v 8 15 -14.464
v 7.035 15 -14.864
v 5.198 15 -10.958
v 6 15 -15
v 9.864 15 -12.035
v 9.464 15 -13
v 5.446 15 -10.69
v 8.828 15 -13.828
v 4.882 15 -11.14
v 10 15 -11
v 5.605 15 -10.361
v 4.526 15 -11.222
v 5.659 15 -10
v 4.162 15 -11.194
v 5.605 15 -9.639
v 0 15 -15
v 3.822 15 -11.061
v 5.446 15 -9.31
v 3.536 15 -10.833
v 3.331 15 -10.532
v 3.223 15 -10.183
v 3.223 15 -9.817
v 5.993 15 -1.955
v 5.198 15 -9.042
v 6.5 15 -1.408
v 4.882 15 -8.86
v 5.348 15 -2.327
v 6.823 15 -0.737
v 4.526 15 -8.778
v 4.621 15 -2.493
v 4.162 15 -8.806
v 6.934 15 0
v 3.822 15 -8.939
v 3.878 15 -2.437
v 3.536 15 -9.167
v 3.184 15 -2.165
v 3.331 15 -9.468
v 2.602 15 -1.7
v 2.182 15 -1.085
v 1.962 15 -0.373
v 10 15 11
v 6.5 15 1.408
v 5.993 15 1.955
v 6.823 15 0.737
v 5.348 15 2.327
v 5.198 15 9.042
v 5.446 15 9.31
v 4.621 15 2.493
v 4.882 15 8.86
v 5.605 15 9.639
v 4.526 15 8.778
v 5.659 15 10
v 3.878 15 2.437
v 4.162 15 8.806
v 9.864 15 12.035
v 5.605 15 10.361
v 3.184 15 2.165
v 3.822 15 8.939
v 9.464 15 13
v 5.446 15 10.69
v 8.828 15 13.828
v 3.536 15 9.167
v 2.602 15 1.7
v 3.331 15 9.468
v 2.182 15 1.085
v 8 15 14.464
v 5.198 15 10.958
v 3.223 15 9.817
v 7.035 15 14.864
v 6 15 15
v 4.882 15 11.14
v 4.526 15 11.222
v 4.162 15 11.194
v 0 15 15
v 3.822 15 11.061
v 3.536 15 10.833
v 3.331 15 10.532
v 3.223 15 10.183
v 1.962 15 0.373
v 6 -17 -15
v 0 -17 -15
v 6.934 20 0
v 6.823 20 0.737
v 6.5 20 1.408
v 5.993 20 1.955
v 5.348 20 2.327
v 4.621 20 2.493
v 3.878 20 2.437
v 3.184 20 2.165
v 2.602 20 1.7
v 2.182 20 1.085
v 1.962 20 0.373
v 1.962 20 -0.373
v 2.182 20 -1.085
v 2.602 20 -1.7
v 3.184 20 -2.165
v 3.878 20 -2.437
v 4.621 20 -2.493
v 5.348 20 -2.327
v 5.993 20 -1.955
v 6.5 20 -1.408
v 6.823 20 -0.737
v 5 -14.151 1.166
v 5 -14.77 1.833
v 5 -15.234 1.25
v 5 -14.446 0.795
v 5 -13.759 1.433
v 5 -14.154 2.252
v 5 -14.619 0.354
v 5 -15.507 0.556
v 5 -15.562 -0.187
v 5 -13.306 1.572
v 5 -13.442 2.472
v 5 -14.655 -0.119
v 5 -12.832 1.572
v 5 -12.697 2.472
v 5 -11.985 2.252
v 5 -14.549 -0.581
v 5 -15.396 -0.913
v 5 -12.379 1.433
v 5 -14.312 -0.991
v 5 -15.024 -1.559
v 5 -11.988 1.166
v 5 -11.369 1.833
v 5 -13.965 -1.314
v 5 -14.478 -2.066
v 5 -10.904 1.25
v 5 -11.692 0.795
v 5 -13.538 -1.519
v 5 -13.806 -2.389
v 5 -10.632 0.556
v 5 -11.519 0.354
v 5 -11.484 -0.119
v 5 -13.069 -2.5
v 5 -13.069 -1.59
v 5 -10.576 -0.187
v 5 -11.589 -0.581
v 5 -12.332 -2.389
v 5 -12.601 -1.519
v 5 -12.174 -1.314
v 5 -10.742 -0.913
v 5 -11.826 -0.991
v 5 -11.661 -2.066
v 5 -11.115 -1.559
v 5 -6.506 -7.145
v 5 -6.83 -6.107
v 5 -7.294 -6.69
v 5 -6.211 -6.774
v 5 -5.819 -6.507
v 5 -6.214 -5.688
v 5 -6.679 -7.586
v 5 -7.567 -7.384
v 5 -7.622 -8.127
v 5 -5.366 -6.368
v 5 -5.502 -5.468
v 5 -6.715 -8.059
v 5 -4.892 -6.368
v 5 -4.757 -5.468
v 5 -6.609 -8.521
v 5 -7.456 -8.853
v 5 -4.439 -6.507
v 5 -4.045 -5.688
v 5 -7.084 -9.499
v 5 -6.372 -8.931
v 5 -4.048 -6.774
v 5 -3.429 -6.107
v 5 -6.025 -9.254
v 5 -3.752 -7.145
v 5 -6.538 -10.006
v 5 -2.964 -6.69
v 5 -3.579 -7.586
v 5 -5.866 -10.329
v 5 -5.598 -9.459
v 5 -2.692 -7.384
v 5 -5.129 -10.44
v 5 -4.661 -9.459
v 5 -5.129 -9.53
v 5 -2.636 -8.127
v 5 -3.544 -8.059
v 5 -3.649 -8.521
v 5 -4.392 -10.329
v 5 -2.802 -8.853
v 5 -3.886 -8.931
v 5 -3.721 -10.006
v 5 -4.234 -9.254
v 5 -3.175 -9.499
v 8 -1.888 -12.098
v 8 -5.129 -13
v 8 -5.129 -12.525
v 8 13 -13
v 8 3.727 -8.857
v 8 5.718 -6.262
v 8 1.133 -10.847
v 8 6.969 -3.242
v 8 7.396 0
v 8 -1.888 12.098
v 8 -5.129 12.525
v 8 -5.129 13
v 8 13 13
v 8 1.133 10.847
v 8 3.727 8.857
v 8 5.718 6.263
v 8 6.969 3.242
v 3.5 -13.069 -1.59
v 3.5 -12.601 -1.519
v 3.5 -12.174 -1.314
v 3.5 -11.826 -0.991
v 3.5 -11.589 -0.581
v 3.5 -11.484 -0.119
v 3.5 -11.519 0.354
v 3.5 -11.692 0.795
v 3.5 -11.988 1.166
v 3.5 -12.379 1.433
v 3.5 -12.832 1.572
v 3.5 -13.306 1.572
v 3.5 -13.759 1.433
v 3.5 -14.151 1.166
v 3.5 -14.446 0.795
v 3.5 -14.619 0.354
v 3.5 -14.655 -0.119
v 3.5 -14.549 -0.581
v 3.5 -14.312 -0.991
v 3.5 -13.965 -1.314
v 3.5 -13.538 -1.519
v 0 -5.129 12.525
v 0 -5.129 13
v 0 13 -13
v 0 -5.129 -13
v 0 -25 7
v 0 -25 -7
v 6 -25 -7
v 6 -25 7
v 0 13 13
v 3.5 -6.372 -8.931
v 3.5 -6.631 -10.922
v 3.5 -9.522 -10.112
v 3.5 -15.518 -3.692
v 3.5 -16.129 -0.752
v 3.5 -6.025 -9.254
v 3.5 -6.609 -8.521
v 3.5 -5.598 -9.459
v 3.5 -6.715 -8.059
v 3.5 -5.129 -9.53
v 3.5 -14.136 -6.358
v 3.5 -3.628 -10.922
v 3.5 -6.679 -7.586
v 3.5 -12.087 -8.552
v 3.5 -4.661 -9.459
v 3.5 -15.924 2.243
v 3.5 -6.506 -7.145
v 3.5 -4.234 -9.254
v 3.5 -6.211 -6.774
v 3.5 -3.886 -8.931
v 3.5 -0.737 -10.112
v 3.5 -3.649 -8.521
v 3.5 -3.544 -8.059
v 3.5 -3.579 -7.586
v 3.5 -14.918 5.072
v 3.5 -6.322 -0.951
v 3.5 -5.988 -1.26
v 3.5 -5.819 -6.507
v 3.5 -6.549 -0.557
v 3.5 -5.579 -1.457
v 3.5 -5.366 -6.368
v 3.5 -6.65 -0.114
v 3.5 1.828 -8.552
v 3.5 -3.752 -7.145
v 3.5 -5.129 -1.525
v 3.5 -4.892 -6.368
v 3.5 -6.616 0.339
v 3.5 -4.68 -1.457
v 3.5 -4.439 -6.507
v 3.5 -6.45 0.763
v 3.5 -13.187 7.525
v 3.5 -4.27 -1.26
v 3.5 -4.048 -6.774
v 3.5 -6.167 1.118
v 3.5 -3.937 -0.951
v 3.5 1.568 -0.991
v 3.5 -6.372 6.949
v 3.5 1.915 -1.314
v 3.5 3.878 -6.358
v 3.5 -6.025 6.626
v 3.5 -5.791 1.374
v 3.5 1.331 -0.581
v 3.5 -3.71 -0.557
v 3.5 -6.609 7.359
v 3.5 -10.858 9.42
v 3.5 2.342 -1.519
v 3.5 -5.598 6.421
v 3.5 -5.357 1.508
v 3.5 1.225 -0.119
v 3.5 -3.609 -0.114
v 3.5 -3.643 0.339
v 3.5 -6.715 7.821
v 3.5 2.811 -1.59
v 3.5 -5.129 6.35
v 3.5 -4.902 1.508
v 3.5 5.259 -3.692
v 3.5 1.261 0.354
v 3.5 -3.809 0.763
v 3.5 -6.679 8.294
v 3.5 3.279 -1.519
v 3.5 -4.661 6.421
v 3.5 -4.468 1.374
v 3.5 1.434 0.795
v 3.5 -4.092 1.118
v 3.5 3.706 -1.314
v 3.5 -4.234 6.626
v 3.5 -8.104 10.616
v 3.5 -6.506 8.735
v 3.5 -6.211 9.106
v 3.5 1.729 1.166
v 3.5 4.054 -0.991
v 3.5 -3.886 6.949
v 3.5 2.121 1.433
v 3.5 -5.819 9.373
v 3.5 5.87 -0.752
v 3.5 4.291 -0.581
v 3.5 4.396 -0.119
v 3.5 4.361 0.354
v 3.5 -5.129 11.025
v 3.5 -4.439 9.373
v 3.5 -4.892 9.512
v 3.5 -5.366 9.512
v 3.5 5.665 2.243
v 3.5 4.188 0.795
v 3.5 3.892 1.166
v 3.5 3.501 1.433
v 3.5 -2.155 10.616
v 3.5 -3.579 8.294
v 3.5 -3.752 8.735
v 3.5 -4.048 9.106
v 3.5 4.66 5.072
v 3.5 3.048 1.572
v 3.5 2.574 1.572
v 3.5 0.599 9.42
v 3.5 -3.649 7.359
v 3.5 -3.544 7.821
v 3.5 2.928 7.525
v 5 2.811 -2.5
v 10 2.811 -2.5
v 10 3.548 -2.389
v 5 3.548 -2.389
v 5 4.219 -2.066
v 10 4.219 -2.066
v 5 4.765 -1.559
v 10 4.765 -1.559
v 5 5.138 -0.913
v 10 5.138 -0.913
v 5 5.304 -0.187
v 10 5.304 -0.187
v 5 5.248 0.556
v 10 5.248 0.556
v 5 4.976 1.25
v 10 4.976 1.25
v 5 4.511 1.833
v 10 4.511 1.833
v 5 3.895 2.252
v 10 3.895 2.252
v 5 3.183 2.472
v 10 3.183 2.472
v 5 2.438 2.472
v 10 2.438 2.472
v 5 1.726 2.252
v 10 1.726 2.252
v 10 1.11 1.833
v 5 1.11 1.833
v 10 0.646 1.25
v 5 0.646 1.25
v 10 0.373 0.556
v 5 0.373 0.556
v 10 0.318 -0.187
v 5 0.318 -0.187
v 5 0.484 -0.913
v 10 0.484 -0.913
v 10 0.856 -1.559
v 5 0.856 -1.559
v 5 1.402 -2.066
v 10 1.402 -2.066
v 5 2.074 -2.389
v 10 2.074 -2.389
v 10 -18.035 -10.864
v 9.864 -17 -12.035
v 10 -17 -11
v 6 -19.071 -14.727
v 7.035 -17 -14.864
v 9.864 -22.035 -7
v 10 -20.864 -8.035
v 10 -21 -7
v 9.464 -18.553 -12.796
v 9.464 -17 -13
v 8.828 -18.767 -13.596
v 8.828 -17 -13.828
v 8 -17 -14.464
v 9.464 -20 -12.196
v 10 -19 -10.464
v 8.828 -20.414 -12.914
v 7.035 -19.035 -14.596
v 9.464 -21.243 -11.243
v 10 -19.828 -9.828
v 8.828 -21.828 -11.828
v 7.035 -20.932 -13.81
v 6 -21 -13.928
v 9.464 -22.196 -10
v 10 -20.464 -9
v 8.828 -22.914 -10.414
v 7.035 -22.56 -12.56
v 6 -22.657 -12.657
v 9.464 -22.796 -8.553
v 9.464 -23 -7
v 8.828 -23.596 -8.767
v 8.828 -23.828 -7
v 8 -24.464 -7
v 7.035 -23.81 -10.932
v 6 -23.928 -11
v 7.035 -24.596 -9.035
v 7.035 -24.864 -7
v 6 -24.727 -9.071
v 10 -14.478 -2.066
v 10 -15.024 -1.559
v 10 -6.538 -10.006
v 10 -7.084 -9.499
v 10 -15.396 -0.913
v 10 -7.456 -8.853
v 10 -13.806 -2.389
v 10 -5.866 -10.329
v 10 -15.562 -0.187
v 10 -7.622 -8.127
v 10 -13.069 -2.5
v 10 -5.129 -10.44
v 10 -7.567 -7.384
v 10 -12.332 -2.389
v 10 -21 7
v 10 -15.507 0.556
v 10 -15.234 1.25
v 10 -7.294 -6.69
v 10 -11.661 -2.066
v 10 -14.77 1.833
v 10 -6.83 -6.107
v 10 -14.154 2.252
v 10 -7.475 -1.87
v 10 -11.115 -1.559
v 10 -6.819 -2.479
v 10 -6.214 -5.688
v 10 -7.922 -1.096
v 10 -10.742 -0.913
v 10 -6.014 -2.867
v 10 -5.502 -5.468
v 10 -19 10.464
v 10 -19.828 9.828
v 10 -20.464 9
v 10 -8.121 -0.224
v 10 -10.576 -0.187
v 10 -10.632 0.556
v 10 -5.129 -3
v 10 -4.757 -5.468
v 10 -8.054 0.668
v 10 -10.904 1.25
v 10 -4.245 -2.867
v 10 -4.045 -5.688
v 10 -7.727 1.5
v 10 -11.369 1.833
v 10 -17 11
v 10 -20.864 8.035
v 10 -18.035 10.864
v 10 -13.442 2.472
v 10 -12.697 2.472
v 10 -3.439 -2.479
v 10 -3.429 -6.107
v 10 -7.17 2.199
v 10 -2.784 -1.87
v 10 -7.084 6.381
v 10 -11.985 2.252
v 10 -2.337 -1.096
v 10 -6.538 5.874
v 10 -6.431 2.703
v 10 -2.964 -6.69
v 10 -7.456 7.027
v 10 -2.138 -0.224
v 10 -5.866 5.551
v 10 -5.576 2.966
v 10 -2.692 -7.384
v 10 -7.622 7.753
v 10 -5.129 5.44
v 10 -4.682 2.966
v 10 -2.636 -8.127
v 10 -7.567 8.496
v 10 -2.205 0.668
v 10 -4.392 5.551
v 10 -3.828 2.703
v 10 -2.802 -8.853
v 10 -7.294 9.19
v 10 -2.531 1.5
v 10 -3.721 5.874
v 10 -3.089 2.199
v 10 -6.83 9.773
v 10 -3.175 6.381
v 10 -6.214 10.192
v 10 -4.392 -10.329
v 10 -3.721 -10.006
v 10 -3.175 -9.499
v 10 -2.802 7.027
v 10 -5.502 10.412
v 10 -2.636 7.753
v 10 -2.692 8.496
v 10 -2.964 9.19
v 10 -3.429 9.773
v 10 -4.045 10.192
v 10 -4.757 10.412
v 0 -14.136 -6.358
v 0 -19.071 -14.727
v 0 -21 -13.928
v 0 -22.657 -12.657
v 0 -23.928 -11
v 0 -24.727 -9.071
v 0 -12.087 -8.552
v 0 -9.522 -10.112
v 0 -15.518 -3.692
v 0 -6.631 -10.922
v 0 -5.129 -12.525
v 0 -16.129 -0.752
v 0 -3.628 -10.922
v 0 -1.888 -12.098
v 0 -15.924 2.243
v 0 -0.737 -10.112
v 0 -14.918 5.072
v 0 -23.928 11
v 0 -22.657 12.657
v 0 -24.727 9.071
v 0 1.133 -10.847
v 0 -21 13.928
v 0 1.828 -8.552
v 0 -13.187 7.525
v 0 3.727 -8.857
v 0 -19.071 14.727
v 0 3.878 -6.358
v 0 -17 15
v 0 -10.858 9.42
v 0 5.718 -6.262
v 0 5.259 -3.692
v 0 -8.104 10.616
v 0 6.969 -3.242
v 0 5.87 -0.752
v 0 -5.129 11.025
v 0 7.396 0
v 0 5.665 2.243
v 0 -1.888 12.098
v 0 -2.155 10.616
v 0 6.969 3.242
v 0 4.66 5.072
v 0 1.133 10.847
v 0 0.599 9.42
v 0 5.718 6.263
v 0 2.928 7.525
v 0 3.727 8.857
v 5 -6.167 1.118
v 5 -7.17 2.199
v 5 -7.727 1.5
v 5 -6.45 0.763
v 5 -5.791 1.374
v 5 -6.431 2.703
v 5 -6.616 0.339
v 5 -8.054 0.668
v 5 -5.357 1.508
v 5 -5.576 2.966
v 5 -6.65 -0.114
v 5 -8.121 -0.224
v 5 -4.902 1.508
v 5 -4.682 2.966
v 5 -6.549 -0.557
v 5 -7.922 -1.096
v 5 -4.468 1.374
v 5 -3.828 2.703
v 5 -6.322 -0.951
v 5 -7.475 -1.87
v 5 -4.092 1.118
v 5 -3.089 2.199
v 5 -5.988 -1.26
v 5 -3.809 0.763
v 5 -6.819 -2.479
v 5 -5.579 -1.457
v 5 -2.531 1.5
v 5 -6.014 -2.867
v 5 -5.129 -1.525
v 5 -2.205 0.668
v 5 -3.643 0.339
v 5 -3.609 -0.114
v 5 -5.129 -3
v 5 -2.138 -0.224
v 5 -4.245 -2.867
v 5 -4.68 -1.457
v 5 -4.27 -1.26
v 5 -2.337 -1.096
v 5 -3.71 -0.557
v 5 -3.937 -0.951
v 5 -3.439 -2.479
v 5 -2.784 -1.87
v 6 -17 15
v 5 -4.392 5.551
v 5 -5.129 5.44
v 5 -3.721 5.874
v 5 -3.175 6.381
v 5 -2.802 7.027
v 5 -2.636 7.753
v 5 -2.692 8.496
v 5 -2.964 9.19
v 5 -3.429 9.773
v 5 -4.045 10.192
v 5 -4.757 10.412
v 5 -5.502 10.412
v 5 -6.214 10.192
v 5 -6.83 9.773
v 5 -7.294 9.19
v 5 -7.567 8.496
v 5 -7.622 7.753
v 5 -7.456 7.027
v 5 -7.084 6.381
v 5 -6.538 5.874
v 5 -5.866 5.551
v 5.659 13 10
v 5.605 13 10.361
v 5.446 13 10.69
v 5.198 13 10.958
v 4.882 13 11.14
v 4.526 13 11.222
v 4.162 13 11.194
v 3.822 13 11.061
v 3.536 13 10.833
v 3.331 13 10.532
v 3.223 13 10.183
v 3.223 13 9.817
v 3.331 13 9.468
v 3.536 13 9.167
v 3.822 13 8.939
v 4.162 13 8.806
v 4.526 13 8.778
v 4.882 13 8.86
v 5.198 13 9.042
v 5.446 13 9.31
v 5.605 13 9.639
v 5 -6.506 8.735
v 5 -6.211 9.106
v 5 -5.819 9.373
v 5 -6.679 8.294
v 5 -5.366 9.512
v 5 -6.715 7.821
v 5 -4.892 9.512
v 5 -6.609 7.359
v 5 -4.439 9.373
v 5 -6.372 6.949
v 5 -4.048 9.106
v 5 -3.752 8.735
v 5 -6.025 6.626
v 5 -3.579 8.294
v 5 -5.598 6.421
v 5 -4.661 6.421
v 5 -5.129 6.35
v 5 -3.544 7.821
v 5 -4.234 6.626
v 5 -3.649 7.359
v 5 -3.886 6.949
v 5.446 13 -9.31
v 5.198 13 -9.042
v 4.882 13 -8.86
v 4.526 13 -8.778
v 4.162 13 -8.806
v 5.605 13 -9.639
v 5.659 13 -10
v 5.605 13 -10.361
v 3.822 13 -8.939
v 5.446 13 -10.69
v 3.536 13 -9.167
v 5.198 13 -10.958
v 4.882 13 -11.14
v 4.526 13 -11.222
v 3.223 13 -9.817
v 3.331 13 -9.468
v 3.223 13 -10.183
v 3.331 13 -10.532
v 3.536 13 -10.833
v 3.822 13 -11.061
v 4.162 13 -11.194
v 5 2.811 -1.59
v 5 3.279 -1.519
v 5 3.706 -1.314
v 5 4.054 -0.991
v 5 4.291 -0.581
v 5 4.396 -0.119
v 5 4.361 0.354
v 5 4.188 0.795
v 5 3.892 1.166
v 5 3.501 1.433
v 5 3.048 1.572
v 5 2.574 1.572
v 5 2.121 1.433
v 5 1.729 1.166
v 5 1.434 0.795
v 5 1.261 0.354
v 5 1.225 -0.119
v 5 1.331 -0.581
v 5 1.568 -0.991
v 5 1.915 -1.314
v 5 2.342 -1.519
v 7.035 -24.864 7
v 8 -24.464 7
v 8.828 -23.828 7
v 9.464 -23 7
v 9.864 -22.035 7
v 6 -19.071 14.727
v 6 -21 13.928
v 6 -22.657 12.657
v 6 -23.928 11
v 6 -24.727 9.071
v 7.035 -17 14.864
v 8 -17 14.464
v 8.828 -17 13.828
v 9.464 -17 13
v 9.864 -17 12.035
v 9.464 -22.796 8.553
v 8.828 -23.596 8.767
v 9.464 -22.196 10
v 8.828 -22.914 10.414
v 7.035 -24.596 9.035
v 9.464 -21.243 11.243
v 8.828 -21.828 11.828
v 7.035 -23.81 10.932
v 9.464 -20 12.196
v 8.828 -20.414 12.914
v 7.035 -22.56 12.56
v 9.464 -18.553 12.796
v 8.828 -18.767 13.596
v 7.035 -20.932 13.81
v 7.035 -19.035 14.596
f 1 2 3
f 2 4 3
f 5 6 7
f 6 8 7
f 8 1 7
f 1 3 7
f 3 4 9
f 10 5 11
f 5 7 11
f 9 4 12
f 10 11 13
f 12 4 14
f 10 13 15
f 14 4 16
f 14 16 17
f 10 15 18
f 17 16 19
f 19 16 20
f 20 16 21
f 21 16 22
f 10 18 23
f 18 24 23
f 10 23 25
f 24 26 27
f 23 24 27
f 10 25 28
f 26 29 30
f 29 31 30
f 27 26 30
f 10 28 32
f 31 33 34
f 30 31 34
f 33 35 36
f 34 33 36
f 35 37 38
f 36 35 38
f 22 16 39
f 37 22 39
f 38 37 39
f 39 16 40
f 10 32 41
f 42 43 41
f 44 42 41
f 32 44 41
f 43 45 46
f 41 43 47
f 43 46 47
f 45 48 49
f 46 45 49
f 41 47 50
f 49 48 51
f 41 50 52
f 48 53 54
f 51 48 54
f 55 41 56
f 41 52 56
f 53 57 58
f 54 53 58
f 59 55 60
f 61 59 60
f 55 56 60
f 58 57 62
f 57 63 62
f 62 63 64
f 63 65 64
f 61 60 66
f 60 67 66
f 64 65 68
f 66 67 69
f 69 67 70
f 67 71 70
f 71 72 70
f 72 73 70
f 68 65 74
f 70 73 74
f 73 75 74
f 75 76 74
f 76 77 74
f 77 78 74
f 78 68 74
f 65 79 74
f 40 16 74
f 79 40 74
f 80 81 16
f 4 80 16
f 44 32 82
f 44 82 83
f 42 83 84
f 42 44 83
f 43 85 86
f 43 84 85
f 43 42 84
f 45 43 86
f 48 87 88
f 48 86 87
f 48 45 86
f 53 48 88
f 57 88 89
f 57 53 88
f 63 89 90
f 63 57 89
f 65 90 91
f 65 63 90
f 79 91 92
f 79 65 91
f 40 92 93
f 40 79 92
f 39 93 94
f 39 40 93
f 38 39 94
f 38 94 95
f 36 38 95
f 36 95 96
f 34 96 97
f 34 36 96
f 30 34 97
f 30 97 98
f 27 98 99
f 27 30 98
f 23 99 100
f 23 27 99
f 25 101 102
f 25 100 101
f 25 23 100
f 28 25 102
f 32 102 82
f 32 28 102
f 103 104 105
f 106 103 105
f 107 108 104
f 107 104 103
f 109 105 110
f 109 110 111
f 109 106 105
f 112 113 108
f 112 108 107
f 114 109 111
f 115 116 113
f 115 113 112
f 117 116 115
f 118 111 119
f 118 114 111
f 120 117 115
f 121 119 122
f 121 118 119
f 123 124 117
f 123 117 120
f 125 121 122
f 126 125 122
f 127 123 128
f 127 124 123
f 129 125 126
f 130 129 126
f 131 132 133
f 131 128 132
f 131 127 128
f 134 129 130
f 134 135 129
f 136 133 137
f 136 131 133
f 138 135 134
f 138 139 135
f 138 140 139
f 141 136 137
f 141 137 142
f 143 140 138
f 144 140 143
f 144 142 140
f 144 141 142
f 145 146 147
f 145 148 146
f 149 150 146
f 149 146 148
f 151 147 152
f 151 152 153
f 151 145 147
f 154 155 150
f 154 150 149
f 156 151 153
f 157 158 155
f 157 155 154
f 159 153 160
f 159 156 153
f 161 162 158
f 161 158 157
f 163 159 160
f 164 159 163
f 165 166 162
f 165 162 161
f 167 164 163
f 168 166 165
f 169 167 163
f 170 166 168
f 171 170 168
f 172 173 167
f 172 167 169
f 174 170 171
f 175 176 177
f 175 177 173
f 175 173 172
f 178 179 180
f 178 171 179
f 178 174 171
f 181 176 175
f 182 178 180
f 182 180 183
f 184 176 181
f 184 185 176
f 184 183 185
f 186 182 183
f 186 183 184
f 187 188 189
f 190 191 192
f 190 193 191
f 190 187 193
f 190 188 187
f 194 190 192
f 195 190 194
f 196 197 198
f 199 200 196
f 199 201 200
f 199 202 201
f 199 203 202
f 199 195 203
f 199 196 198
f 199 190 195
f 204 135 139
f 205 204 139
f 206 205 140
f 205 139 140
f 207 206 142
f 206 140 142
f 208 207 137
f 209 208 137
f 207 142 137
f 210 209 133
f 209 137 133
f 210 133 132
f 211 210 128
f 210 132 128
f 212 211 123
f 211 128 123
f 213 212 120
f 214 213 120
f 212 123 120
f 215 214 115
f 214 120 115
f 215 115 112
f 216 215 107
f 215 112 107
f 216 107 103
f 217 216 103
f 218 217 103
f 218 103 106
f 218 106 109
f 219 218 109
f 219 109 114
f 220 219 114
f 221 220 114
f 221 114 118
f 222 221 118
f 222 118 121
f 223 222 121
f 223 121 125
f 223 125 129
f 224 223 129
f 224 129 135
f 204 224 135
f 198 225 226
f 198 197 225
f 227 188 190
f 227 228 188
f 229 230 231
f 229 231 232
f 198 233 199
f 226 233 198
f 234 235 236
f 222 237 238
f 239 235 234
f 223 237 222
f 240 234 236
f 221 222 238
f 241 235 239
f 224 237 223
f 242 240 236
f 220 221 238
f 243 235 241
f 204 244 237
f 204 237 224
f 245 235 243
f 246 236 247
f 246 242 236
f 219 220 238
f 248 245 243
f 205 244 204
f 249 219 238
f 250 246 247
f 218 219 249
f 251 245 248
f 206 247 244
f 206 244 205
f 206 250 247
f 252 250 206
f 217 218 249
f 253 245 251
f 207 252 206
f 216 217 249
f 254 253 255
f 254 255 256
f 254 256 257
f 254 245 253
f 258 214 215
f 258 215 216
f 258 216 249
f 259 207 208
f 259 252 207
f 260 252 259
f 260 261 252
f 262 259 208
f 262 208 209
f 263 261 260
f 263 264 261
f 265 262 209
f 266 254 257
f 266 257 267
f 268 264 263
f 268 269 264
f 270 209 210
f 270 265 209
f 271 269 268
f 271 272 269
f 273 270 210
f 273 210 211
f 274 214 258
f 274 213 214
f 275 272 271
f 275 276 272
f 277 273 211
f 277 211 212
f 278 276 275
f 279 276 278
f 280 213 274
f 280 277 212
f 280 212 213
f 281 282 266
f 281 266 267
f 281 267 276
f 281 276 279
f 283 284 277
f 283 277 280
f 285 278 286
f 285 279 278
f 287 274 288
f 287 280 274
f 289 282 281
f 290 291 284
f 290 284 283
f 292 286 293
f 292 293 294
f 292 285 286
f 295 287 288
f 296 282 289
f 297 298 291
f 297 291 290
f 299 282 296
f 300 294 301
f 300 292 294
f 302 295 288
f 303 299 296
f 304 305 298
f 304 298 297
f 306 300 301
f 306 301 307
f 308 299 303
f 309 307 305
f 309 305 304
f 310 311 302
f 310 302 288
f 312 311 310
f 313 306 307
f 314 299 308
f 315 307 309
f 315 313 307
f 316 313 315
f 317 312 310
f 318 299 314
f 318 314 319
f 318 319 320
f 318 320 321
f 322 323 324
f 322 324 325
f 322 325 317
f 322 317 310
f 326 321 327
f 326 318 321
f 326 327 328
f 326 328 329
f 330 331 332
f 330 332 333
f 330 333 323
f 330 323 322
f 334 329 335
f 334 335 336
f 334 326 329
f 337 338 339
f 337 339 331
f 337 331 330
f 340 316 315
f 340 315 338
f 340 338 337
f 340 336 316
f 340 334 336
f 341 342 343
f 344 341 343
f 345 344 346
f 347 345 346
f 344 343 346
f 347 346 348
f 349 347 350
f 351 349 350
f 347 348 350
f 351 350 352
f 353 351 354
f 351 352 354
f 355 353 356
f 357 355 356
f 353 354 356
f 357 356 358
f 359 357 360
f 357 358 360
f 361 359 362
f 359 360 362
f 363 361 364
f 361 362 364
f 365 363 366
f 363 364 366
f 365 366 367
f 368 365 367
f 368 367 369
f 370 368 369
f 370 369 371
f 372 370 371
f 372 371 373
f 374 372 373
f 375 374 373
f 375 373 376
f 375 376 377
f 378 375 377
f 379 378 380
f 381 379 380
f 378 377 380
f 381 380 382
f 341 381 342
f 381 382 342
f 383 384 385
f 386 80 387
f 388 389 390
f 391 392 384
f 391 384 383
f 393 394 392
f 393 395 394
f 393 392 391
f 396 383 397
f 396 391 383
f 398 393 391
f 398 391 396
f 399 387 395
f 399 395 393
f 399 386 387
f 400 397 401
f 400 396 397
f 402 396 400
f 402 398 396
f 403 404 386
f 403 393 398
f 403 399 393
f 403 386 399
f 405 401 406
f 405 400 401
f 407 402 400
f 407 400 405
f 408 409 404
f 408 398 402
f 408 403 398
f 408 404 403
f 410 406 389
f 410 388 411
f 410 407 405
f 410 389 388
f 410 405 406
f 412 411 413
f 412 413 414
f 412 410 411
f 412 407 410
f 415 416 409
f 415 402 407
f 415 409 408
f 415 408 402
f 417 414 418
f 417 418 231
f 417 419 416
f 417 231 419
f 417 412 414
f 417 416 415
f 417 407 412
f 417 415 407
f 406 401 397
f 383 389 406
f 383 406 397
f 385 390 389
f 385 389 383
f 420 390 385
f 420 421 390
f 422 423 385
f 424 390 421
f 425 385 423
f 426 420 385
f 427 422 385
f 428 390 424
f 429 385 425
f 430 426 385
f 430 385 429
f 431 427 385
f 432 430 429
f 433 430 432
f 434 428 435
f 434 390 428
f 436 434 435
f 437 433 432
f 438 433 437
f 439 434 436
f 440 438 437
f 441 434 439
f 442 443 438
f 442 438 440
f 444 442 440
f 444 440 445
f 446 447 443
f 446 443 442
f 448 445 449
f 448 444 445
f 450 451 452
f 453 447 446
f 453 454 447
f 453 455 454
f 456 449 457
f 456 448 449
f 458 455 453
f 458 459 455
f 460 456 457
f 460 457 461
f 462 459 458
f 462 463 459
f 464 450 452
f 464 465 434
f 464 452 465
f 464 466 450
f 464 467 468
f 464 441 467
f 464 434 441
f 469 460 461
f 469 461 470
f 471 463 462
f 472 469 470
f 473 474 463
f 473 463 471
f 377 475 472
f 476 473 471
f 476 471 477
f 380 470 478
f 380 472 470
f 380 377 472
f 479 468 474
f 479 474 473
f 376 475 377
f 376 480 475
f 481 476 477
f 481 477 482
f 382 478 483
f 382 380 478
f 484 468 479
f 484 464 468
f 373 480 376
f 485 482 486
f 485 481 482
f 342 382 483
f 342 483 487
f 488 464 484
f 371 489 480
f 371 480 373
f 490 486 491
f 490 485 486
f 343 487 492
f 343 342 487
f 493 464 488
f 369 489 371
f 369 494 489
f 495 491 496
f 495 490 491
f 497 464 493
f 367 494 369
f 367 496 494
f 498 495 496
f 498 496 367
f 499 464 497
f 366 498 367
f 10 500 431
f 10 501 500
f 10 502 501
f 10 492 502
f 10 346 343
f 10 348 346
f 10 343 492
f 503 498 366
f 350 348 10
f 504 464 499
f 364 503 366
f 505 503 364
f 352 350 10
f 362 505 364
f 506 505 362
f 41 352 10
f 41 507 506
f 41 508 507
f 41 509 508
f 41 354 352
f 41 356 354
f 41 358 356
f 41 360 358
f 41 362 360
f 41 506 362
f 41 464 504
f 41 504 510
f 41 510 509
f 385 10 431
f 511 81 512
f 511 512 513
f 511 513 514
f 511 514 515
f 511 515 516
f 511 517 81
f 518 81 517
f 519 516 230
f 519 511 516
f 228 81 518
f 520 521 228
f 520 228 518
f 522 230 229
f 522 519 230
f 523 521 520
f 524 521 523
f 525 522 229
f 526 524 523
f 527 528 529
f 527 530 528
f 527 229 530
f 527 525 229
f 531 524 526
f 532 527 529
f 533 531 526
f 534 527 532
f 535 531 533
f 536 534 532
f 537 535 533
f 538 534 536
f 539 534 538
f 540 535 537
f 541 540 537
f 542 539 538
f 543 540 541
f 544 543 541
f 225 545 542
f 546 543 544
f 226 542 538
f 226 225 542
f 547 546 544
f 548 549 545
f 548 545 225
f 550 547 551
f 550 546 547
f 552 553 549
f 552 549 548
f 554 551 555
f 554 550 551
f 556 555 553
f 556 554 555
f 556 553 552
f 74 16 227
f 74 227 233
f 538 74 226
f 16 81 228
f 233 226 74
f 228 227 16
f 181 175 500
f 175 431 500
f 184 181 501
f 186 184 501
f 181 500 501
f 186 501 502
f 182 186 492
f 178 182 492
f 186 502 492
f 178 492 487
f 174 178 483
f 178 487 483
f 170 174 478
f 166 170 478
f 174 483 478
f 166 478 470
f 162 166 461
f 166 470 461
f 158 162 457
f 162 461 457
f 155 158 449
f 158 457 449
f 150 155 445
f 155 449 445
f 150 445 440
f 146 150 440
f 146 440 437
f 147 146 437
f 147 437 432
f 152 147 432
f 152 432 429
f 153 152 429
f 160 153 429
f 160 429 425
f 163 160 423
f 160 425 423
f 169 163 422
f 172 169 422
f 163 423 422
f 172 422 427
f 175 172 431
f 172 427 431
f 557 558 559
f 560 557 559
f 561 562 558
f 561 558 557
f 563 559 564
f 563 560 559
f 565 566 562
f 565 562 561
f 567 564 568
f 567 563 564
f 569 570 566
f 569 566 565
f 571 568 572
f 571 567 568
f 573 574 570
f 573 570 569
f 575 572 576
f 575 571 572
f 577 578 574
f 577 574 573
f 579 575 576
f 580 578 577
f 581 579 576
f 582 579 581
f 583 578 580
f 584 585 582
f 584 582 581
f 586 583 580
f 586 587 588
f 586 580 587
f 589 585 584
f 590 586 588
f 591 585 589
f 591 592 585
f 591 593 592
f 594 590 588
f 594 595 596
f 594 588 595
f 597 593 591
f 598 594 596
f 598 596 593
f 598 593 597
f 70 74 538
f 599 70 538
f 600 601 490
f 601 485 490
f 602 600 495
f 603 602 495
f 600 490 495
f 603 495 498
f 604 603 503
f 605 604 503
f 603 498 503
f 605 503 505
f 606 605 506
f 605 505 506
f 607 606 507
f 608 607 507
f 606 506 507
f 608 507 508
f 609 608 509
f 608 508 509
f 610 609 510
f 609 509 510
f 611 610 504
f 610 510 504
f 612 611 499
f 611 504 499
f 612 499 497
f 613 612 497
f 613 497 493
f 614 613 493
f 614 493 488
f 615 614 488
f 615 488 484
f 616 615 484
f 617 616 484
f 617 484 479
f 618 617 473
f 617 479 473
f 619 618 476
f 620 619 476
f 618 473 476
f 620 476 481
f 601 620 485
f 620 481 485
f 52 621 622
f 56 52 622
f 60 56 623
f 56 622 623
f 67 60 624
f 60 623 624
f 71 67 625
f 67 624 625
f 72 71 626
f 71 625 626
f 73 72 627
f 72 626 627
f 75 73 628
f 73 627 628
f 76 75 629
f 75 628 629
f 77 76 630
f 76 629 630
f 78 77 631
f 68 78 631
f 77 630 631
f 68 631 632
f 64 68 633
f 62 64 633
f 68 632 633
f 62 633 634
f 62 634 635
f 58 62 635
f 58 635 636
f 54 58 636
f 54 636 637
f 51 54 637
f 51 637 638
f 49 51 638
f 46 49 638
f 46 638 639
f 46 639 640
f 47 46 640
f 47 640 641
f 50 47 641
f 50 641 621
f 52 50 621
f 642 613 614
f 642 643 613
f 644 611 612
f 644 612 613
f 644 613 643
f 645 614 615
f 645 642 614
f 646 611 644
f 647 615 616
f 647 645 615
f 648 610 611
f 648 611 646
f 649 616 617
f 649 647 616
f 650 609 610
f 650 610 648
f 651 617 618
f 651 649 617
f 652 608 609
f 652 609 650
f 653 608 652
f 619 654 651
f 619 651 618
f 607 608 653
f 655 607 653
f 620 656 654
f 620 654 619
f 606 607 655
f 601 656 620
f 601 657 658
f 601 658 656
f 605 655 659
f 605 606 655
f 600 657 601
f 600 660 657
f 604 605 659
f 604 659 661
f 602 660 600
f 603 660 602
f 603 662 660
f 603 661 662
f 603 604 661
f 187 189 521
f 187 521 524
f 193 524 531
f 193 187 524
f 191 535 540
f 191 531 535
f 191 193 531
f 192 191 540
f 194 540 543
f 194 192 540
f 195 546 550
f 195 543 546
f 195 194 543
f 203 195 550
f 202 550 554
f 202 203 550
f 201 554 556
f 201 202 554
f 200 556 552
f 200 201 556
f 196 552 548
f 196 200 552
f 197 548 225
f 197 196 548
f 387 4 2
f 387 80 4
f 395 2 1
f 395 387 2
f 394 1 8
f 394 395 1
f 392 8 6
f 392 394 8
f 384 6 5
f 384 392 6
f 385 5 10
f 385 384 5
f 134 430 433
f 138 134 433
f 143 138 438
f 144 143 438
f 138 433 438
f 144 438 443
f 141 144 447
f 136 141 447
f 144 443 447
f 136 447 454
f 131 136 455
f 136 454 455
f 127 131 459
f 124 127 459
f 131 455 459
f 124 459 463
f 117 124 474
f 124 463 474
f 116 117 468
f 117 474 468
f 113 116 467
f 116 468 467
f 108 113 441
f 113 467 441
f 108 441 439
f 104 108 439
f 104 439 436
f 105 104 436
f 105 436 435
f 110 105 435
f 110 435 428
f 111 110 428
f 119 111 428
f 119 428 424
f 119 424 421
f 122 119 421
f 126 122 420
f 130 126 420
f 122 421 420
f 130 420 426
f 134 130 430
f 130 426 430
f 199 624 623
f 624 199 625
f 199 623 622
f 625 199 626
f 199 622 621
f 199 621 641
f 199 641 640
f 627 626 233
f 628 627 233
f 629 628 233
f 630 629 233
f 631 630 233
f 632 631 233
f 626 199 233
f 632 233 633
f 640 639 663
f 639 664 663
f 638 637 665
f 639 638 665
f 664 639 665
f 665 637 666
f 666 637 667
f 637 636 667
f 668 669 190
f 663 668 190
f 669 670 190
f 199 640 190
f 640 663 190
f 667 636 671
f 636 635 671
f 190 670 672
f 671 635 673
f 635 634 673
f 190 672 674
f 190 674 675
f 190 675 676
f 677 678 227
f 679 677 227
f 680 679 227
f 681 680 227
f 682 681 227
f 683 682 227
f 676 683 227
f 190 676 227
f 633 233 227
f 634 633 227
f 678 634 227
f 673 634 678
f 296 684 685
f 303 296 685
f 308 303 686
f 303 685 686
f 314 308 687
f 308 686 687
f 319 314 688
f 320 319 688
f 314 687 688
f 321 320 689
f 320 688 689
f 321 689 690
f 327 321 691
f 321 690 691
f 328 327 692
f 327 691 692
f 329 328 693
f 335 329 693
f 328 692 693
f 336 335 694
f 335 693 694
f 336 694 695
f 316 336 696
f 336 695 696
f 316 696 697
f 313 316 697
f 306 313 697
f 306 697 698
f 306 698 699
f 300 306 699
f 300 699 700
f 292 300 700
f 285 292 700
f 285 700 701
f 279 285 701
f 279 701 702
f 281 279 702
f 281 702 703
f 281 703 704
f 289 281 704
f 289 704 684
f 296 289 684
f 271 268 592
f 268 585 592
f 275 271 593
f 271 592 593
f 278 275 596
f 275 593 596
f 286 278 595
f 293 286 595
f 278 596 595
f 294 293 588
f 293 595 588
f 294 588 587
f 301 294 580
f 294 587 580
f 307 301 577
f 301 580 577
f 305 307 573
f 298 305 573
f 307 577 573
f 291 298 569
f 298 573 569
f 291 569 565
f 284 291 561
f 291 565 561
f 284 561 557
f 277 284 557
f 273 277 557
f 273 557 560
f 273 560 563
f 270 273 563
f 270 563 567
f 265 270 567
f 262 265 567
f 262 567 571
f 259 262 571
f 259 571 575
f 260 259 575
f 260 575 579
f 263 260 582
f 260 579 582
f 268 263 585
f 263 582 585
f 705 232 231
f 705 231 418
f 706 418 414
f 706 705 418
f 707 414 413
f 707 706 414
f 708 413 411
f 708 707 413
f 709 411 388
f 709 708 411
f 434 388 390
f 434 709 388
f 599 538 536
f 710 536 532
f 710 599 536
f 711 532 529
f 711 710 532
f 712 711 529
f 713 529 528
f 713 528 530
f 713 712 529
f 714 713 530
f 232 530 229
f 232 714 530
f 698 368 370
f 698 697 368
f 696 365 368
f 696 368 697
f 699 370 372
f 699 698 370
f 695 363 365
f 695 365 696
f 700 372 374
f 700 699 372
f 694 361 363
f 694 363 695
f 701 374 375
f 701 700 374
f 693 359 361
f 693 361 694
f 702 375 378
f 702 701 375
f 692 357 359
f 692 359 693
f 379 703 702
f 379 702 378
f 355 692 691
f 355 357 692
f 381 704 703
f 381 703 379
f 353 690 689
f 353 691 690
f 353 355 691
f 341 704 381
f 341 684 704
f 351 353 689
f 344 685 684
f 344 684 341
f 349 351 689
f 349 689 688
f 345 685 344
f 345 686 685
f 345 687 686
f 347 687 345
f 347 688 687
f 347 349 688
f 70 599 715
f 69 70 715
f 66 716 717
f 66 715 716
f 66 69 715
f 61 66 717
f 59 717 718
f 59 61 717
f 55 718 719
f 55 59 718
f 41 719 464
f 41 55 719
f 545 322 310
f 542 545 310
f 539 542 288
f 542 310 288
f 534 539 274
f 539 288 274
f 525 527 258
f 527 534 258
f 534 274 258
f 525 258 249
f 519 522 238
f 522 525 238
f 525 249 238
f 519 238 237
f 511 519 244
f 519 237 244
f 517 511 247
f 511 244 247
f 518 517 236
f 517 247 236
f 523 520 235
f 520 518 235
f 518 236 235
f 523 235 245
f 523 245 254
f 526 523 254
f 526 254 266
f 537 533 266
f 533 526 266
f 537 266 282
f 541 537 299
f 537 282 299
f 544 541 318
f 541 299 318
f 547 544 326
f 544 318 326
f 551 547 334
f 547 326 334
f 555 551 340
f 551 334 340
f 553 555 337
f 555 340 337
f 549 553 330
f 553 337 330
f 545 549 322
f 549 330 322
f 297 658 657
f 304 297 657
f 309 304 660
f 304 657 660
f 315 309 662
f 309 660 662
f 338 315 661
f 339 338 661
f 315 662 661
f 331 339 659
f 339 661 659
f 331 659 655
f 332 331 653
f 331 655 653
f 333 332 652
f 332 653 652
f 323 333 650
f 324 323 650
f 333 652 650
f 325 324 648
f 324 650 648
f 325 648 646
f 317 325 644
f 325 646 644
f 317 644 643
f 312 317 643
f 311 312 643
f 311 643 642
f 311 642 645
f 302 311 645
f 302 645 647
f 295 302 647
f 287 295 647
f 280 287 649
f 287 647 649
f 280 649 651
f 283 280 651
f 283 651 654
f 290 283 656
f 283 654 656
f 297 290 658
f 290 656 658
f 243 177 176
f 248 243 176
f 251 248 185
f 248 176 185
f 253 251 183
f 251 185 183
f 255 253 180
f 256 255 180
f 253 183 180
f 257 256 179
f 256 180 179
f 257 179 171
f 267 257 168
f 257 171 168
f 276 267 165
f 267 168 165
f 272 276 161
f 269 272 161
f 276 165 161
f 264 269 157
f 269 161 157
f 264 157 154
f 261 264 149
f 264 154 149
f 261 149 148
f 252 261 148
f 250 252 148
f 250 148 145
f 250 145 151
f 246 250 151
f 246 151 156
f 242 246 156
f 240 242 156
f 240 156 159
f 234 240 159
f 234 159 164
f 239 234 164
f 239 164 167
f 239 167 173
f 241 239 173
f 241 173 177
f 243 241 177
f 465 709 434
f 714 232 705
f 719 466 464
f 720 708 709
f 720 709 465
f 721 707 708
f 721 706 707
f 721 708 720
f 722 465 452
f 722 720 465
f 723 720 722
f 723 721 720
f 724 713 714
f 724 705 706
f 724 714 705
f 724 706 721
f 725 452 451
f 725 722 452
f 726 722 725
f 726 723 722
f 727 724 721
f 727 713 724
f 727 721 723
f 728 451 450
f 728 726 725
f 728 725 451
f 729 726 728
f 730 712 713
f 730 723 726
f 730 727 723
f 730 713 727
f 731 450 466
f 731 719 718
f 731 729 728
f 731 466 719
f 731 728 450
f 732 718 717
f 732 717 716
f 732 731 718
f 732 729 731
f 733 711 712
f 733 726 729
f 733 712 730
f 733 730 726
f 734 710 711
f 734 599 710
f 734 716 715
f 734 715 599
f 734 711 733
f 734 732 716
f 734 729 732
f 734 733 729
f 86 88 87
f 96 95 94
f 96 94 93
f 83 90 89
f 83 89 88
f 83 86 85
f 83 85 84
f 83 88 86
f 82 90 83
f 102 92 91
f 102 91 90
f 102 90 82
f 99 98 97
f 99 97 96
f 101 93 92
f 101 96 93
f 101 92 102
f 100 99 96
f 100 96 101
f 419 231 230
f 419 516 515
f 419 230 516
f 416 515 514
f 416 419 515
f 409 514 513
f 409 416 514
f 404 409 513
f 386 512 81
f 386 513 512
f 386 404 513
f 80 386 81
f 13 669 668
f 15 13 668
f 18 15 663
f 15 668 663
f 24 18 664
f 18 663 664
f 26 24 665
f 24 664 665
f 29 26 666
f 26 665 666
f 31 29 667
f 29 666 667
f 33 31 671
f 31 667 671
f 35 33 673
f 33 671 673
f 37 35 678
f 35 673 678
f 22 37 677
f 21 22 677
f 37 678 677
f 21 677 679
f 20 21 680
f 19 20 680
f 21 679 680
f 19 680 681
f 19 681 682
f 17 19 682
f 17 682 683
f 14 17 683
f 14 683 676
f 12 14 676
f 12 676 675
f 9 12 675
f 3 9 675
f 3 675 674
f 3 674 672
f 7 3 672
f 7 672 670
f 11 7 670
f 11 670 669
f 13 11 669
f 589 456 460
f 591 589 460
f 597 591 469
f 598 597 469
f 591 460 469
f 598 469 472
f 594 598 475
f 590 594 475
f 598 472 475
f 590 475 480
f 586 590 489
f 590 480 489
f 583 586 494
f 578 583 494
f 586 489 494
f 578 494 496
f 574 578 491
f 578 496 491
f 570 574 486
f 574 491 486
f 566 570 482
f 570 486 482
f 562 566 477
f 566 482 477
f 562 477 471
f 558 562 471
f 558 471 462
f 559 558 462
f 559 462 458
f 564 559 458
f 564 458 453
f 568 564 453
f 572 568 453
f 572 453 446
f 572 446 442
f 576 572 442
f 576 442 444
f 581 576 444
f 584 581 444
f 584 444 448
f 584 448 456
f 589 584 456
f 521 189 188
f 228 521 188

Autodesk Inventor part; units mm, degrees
ref_plane "YZ Plane" through (0, 0, 0) normal (1, 0, 0) x (0, 1, 0)
ref_plane "XZ Plane" through (0, 0, 0) normal (0, 1, 0) x (-1, 0, 0)
ref_plane "XY Plane" through (0, 0, 0) normal (0, 0, 1) x (1, 0, 0)
sketch "Sketch1" plane through (0, 0, 0) normal (1, 0, 0) x (0, 1, 0)
  line L0 (15, 15) -> (-15, 15)
  line L1 (-15, -15) -> (15, -15)
  line L2 (15, -15) -> (15, 15)
  line L3 (15, 15) -> (-15, -15) construction
  line L4 (-15, 15) -> (15, -15) construction
  line L5 (-15, -15) -> (-25, -15)
  line L6 (-25, -15) -> (-25, 15)
  line L7 (-25, 15) -> (-15, 15)
  point P0 (0, 0)
  dimension "d0" = 30
  dimension "d1" = 30
  dimension "d13" = 10
extrude "Extrusion1" add sketch "Sketch1" along normal blind 10
sketch "Sketch2" plane through (0, 0, 0) normal (-1, 0, 0) x (0, 0, 1)
  line L0 (-13, -13) -> (-13, 13)
  line L1 (13, 13) -> (13, -13)
  line L2 (13, 13) -> (-13, 13)
  line L3 (-13, -13) -> (-13, -23)
  line L4 (-13, -23) -> (13, -23)
  line L5 (13, -23) -> (13, -13)
  point P0 (0, 0)
  dimension "d14" = 10
extrude "Extrusion2" cut sketch "Sketch2" against normal blind 8
sketch "Sketch3" plane through (0, 15, 15) normal (0, 1, 0) x (1, 0, 0)
  circle A0 centre (4.4342, 15) radius 2.5 projected
  point P0 (0, 15)
extrude "Extrusion3" add sketch "Sketch3" along normal blind 5
sketch "Sketch4" plane through (0, 13, -13) normal (0, -1, 0) x (1, 0, 0)
  circle A0 centre (4.4342, 23) radius 1.225 projected
  circle A1 centre (4.4342, 3) radius 1.225 projected
  point P0 (0, 13)
extrude "Extrusion4" cut sketch "Sketch4" against normal blind 2
fillet "Fillet4" radius 8 4 edges at (4, -23, 13) (4, -23, -13) (5, -25, -15) (5, -25, 15)
fillet "Fillet5" radius 4 4 edges at (10, -25, 0) (10, -22.6569, 12.6569) (10, -1, -15) (10, -22.6569, -12.6569)
sketch "Sketch5" plane through (8, 0, 0) normal (-1, 0, 0) x (0, 0, 1)
  arc A0 (12.525, -5.1293) -> (-12.525, -5.1293) centre (0, -5.1293) ccw
  circle A1 centre (0, -5.1293) radius 11.025
  arc A2 (5, -23) -> (13, -15) centre (5, -15) ccw
  line L0 (13, -5.1293) -> (13, -15)
  line L1 (5, -23) -> (-5, -23)
  arc A3 (-13, -15) -> (-5, -23) centre (-5, -15) ccw
  line L2 (-13, -15) -> (-13, -5.1293)
  line L3 (12.525, -5.1293) -> (13, -5.1293)
  line L4 (13, -5.1293) -> (13, -15)
  line L5 (-12.525, -5.1293) -> (-13, -5.1293)
  line L6 (-13, -15) -> (-13, -5.1293)
  point P0 (0, 0)
extrude "Extrusion5" add sketch "Sketch5" along normal blind 8
sketch "Sketch6" plane through (8, -5.1293, 0) normal (-1, 0, 0) x (0, 0, 1)
  circle A0 centre (0, 0) radius 11.025 projected
  point P0 (0, 5.1293)
extrude "Extrusion6" add sketch "Sketch6" along normal blind 4.5
sketch "Sketch7" plane through (10, 0, 0) normal (1, 0, 0) x (0, 0, -1)
  circle A0 centre (0, -5.1293) radius 1.525
  point P0 (0, 0)
extrude "Extrusion7" cut sketch "Sketch7" against normal blind 8
sketch "Sketch8" plane through (10, 0, 0) normal (1, 0, 0) x (0, 0, -1)
  circle A0 centre (0, -5.1293) radius 1.525 projected
  circle A1 centre (0, -5.1293) radius 3
  point P0 (0, 0)
  dimension "d29" = 6
extrude "Extrusion8" cut sketch "Sketch8" against normal blind 5
sketch "Sketch9" plane through (10, 0, 0) normal (1, 0, 0) x (0, 0, -1)
  circle A0 centre (0, -5.1293) radius 11.025 projected
  line L0 (0, -5.1293) -> (0, -13.0693)
  line L1 (0, -5.1293) -> (0, 2.8107)
  circle A1 centre (0, -5.1293) radius 1.525 projected
  line L2 (0, -5.1293) -> (7.94, -5.1293)
  line L3 (0, -5.1293) -> (-7.94, -5.1293)
  circle A2 centre (7.94, -5.1293) radius 1.59
  circle A3 centre (0, -13.0693) radius 1.59
  circle A4 centre (-7.94, -5.1293) radius 1.59
  circle A5 centre (0, 2.8107) radius 1.59
  point P0 (0, 0)
  dimension "d32" = 7.94
  dimension "d33" = 7.94
  dimension "d34" = 7.94
  dimension "d35" = 7.94
  dimension "d36" = 3.18
  dimension "d37" = 3.18
  dimension "d38" = 3.18
  dimension "d39" = 3.18
extrude "Extrusion9" cut sketch "Sketch9" against normal blind 8 contours A3 | A4 | A5 | A2
sketch "Sketch10" plane through (10, 0, 0) normal (1, 0, 0) x (0, 0, -1)
  circle A0 centre (0, 2.8107) radius 1.59 projected
  circle A1 centre (7.94, -5.1293) radius 1.59 projected
  circle A2 centre (0, -13.0693) radius 1.59 projected
  circle A3 centre (-7.94, -5.1293) radius 1.59 projected
  circle A4 centre (0, 2.8107) radius 2.5
  circle A5 centre (7.94, -5.1293) radius 2.5
  circle A6 centre (0, -13.0693) radius 2.5
  circle A7 centre (-7.94, -5.1293) radius 2.5
  point P0 (0, 0)
  dimension "d42" = 5
  dimension "d43" = 5
  dimension "d44" = 5
  dimension "d45" = 5
extrude "Extrusion10" cut sketch "Sketch10" against normal blind 5
properties part number "TapaPieEfector"
